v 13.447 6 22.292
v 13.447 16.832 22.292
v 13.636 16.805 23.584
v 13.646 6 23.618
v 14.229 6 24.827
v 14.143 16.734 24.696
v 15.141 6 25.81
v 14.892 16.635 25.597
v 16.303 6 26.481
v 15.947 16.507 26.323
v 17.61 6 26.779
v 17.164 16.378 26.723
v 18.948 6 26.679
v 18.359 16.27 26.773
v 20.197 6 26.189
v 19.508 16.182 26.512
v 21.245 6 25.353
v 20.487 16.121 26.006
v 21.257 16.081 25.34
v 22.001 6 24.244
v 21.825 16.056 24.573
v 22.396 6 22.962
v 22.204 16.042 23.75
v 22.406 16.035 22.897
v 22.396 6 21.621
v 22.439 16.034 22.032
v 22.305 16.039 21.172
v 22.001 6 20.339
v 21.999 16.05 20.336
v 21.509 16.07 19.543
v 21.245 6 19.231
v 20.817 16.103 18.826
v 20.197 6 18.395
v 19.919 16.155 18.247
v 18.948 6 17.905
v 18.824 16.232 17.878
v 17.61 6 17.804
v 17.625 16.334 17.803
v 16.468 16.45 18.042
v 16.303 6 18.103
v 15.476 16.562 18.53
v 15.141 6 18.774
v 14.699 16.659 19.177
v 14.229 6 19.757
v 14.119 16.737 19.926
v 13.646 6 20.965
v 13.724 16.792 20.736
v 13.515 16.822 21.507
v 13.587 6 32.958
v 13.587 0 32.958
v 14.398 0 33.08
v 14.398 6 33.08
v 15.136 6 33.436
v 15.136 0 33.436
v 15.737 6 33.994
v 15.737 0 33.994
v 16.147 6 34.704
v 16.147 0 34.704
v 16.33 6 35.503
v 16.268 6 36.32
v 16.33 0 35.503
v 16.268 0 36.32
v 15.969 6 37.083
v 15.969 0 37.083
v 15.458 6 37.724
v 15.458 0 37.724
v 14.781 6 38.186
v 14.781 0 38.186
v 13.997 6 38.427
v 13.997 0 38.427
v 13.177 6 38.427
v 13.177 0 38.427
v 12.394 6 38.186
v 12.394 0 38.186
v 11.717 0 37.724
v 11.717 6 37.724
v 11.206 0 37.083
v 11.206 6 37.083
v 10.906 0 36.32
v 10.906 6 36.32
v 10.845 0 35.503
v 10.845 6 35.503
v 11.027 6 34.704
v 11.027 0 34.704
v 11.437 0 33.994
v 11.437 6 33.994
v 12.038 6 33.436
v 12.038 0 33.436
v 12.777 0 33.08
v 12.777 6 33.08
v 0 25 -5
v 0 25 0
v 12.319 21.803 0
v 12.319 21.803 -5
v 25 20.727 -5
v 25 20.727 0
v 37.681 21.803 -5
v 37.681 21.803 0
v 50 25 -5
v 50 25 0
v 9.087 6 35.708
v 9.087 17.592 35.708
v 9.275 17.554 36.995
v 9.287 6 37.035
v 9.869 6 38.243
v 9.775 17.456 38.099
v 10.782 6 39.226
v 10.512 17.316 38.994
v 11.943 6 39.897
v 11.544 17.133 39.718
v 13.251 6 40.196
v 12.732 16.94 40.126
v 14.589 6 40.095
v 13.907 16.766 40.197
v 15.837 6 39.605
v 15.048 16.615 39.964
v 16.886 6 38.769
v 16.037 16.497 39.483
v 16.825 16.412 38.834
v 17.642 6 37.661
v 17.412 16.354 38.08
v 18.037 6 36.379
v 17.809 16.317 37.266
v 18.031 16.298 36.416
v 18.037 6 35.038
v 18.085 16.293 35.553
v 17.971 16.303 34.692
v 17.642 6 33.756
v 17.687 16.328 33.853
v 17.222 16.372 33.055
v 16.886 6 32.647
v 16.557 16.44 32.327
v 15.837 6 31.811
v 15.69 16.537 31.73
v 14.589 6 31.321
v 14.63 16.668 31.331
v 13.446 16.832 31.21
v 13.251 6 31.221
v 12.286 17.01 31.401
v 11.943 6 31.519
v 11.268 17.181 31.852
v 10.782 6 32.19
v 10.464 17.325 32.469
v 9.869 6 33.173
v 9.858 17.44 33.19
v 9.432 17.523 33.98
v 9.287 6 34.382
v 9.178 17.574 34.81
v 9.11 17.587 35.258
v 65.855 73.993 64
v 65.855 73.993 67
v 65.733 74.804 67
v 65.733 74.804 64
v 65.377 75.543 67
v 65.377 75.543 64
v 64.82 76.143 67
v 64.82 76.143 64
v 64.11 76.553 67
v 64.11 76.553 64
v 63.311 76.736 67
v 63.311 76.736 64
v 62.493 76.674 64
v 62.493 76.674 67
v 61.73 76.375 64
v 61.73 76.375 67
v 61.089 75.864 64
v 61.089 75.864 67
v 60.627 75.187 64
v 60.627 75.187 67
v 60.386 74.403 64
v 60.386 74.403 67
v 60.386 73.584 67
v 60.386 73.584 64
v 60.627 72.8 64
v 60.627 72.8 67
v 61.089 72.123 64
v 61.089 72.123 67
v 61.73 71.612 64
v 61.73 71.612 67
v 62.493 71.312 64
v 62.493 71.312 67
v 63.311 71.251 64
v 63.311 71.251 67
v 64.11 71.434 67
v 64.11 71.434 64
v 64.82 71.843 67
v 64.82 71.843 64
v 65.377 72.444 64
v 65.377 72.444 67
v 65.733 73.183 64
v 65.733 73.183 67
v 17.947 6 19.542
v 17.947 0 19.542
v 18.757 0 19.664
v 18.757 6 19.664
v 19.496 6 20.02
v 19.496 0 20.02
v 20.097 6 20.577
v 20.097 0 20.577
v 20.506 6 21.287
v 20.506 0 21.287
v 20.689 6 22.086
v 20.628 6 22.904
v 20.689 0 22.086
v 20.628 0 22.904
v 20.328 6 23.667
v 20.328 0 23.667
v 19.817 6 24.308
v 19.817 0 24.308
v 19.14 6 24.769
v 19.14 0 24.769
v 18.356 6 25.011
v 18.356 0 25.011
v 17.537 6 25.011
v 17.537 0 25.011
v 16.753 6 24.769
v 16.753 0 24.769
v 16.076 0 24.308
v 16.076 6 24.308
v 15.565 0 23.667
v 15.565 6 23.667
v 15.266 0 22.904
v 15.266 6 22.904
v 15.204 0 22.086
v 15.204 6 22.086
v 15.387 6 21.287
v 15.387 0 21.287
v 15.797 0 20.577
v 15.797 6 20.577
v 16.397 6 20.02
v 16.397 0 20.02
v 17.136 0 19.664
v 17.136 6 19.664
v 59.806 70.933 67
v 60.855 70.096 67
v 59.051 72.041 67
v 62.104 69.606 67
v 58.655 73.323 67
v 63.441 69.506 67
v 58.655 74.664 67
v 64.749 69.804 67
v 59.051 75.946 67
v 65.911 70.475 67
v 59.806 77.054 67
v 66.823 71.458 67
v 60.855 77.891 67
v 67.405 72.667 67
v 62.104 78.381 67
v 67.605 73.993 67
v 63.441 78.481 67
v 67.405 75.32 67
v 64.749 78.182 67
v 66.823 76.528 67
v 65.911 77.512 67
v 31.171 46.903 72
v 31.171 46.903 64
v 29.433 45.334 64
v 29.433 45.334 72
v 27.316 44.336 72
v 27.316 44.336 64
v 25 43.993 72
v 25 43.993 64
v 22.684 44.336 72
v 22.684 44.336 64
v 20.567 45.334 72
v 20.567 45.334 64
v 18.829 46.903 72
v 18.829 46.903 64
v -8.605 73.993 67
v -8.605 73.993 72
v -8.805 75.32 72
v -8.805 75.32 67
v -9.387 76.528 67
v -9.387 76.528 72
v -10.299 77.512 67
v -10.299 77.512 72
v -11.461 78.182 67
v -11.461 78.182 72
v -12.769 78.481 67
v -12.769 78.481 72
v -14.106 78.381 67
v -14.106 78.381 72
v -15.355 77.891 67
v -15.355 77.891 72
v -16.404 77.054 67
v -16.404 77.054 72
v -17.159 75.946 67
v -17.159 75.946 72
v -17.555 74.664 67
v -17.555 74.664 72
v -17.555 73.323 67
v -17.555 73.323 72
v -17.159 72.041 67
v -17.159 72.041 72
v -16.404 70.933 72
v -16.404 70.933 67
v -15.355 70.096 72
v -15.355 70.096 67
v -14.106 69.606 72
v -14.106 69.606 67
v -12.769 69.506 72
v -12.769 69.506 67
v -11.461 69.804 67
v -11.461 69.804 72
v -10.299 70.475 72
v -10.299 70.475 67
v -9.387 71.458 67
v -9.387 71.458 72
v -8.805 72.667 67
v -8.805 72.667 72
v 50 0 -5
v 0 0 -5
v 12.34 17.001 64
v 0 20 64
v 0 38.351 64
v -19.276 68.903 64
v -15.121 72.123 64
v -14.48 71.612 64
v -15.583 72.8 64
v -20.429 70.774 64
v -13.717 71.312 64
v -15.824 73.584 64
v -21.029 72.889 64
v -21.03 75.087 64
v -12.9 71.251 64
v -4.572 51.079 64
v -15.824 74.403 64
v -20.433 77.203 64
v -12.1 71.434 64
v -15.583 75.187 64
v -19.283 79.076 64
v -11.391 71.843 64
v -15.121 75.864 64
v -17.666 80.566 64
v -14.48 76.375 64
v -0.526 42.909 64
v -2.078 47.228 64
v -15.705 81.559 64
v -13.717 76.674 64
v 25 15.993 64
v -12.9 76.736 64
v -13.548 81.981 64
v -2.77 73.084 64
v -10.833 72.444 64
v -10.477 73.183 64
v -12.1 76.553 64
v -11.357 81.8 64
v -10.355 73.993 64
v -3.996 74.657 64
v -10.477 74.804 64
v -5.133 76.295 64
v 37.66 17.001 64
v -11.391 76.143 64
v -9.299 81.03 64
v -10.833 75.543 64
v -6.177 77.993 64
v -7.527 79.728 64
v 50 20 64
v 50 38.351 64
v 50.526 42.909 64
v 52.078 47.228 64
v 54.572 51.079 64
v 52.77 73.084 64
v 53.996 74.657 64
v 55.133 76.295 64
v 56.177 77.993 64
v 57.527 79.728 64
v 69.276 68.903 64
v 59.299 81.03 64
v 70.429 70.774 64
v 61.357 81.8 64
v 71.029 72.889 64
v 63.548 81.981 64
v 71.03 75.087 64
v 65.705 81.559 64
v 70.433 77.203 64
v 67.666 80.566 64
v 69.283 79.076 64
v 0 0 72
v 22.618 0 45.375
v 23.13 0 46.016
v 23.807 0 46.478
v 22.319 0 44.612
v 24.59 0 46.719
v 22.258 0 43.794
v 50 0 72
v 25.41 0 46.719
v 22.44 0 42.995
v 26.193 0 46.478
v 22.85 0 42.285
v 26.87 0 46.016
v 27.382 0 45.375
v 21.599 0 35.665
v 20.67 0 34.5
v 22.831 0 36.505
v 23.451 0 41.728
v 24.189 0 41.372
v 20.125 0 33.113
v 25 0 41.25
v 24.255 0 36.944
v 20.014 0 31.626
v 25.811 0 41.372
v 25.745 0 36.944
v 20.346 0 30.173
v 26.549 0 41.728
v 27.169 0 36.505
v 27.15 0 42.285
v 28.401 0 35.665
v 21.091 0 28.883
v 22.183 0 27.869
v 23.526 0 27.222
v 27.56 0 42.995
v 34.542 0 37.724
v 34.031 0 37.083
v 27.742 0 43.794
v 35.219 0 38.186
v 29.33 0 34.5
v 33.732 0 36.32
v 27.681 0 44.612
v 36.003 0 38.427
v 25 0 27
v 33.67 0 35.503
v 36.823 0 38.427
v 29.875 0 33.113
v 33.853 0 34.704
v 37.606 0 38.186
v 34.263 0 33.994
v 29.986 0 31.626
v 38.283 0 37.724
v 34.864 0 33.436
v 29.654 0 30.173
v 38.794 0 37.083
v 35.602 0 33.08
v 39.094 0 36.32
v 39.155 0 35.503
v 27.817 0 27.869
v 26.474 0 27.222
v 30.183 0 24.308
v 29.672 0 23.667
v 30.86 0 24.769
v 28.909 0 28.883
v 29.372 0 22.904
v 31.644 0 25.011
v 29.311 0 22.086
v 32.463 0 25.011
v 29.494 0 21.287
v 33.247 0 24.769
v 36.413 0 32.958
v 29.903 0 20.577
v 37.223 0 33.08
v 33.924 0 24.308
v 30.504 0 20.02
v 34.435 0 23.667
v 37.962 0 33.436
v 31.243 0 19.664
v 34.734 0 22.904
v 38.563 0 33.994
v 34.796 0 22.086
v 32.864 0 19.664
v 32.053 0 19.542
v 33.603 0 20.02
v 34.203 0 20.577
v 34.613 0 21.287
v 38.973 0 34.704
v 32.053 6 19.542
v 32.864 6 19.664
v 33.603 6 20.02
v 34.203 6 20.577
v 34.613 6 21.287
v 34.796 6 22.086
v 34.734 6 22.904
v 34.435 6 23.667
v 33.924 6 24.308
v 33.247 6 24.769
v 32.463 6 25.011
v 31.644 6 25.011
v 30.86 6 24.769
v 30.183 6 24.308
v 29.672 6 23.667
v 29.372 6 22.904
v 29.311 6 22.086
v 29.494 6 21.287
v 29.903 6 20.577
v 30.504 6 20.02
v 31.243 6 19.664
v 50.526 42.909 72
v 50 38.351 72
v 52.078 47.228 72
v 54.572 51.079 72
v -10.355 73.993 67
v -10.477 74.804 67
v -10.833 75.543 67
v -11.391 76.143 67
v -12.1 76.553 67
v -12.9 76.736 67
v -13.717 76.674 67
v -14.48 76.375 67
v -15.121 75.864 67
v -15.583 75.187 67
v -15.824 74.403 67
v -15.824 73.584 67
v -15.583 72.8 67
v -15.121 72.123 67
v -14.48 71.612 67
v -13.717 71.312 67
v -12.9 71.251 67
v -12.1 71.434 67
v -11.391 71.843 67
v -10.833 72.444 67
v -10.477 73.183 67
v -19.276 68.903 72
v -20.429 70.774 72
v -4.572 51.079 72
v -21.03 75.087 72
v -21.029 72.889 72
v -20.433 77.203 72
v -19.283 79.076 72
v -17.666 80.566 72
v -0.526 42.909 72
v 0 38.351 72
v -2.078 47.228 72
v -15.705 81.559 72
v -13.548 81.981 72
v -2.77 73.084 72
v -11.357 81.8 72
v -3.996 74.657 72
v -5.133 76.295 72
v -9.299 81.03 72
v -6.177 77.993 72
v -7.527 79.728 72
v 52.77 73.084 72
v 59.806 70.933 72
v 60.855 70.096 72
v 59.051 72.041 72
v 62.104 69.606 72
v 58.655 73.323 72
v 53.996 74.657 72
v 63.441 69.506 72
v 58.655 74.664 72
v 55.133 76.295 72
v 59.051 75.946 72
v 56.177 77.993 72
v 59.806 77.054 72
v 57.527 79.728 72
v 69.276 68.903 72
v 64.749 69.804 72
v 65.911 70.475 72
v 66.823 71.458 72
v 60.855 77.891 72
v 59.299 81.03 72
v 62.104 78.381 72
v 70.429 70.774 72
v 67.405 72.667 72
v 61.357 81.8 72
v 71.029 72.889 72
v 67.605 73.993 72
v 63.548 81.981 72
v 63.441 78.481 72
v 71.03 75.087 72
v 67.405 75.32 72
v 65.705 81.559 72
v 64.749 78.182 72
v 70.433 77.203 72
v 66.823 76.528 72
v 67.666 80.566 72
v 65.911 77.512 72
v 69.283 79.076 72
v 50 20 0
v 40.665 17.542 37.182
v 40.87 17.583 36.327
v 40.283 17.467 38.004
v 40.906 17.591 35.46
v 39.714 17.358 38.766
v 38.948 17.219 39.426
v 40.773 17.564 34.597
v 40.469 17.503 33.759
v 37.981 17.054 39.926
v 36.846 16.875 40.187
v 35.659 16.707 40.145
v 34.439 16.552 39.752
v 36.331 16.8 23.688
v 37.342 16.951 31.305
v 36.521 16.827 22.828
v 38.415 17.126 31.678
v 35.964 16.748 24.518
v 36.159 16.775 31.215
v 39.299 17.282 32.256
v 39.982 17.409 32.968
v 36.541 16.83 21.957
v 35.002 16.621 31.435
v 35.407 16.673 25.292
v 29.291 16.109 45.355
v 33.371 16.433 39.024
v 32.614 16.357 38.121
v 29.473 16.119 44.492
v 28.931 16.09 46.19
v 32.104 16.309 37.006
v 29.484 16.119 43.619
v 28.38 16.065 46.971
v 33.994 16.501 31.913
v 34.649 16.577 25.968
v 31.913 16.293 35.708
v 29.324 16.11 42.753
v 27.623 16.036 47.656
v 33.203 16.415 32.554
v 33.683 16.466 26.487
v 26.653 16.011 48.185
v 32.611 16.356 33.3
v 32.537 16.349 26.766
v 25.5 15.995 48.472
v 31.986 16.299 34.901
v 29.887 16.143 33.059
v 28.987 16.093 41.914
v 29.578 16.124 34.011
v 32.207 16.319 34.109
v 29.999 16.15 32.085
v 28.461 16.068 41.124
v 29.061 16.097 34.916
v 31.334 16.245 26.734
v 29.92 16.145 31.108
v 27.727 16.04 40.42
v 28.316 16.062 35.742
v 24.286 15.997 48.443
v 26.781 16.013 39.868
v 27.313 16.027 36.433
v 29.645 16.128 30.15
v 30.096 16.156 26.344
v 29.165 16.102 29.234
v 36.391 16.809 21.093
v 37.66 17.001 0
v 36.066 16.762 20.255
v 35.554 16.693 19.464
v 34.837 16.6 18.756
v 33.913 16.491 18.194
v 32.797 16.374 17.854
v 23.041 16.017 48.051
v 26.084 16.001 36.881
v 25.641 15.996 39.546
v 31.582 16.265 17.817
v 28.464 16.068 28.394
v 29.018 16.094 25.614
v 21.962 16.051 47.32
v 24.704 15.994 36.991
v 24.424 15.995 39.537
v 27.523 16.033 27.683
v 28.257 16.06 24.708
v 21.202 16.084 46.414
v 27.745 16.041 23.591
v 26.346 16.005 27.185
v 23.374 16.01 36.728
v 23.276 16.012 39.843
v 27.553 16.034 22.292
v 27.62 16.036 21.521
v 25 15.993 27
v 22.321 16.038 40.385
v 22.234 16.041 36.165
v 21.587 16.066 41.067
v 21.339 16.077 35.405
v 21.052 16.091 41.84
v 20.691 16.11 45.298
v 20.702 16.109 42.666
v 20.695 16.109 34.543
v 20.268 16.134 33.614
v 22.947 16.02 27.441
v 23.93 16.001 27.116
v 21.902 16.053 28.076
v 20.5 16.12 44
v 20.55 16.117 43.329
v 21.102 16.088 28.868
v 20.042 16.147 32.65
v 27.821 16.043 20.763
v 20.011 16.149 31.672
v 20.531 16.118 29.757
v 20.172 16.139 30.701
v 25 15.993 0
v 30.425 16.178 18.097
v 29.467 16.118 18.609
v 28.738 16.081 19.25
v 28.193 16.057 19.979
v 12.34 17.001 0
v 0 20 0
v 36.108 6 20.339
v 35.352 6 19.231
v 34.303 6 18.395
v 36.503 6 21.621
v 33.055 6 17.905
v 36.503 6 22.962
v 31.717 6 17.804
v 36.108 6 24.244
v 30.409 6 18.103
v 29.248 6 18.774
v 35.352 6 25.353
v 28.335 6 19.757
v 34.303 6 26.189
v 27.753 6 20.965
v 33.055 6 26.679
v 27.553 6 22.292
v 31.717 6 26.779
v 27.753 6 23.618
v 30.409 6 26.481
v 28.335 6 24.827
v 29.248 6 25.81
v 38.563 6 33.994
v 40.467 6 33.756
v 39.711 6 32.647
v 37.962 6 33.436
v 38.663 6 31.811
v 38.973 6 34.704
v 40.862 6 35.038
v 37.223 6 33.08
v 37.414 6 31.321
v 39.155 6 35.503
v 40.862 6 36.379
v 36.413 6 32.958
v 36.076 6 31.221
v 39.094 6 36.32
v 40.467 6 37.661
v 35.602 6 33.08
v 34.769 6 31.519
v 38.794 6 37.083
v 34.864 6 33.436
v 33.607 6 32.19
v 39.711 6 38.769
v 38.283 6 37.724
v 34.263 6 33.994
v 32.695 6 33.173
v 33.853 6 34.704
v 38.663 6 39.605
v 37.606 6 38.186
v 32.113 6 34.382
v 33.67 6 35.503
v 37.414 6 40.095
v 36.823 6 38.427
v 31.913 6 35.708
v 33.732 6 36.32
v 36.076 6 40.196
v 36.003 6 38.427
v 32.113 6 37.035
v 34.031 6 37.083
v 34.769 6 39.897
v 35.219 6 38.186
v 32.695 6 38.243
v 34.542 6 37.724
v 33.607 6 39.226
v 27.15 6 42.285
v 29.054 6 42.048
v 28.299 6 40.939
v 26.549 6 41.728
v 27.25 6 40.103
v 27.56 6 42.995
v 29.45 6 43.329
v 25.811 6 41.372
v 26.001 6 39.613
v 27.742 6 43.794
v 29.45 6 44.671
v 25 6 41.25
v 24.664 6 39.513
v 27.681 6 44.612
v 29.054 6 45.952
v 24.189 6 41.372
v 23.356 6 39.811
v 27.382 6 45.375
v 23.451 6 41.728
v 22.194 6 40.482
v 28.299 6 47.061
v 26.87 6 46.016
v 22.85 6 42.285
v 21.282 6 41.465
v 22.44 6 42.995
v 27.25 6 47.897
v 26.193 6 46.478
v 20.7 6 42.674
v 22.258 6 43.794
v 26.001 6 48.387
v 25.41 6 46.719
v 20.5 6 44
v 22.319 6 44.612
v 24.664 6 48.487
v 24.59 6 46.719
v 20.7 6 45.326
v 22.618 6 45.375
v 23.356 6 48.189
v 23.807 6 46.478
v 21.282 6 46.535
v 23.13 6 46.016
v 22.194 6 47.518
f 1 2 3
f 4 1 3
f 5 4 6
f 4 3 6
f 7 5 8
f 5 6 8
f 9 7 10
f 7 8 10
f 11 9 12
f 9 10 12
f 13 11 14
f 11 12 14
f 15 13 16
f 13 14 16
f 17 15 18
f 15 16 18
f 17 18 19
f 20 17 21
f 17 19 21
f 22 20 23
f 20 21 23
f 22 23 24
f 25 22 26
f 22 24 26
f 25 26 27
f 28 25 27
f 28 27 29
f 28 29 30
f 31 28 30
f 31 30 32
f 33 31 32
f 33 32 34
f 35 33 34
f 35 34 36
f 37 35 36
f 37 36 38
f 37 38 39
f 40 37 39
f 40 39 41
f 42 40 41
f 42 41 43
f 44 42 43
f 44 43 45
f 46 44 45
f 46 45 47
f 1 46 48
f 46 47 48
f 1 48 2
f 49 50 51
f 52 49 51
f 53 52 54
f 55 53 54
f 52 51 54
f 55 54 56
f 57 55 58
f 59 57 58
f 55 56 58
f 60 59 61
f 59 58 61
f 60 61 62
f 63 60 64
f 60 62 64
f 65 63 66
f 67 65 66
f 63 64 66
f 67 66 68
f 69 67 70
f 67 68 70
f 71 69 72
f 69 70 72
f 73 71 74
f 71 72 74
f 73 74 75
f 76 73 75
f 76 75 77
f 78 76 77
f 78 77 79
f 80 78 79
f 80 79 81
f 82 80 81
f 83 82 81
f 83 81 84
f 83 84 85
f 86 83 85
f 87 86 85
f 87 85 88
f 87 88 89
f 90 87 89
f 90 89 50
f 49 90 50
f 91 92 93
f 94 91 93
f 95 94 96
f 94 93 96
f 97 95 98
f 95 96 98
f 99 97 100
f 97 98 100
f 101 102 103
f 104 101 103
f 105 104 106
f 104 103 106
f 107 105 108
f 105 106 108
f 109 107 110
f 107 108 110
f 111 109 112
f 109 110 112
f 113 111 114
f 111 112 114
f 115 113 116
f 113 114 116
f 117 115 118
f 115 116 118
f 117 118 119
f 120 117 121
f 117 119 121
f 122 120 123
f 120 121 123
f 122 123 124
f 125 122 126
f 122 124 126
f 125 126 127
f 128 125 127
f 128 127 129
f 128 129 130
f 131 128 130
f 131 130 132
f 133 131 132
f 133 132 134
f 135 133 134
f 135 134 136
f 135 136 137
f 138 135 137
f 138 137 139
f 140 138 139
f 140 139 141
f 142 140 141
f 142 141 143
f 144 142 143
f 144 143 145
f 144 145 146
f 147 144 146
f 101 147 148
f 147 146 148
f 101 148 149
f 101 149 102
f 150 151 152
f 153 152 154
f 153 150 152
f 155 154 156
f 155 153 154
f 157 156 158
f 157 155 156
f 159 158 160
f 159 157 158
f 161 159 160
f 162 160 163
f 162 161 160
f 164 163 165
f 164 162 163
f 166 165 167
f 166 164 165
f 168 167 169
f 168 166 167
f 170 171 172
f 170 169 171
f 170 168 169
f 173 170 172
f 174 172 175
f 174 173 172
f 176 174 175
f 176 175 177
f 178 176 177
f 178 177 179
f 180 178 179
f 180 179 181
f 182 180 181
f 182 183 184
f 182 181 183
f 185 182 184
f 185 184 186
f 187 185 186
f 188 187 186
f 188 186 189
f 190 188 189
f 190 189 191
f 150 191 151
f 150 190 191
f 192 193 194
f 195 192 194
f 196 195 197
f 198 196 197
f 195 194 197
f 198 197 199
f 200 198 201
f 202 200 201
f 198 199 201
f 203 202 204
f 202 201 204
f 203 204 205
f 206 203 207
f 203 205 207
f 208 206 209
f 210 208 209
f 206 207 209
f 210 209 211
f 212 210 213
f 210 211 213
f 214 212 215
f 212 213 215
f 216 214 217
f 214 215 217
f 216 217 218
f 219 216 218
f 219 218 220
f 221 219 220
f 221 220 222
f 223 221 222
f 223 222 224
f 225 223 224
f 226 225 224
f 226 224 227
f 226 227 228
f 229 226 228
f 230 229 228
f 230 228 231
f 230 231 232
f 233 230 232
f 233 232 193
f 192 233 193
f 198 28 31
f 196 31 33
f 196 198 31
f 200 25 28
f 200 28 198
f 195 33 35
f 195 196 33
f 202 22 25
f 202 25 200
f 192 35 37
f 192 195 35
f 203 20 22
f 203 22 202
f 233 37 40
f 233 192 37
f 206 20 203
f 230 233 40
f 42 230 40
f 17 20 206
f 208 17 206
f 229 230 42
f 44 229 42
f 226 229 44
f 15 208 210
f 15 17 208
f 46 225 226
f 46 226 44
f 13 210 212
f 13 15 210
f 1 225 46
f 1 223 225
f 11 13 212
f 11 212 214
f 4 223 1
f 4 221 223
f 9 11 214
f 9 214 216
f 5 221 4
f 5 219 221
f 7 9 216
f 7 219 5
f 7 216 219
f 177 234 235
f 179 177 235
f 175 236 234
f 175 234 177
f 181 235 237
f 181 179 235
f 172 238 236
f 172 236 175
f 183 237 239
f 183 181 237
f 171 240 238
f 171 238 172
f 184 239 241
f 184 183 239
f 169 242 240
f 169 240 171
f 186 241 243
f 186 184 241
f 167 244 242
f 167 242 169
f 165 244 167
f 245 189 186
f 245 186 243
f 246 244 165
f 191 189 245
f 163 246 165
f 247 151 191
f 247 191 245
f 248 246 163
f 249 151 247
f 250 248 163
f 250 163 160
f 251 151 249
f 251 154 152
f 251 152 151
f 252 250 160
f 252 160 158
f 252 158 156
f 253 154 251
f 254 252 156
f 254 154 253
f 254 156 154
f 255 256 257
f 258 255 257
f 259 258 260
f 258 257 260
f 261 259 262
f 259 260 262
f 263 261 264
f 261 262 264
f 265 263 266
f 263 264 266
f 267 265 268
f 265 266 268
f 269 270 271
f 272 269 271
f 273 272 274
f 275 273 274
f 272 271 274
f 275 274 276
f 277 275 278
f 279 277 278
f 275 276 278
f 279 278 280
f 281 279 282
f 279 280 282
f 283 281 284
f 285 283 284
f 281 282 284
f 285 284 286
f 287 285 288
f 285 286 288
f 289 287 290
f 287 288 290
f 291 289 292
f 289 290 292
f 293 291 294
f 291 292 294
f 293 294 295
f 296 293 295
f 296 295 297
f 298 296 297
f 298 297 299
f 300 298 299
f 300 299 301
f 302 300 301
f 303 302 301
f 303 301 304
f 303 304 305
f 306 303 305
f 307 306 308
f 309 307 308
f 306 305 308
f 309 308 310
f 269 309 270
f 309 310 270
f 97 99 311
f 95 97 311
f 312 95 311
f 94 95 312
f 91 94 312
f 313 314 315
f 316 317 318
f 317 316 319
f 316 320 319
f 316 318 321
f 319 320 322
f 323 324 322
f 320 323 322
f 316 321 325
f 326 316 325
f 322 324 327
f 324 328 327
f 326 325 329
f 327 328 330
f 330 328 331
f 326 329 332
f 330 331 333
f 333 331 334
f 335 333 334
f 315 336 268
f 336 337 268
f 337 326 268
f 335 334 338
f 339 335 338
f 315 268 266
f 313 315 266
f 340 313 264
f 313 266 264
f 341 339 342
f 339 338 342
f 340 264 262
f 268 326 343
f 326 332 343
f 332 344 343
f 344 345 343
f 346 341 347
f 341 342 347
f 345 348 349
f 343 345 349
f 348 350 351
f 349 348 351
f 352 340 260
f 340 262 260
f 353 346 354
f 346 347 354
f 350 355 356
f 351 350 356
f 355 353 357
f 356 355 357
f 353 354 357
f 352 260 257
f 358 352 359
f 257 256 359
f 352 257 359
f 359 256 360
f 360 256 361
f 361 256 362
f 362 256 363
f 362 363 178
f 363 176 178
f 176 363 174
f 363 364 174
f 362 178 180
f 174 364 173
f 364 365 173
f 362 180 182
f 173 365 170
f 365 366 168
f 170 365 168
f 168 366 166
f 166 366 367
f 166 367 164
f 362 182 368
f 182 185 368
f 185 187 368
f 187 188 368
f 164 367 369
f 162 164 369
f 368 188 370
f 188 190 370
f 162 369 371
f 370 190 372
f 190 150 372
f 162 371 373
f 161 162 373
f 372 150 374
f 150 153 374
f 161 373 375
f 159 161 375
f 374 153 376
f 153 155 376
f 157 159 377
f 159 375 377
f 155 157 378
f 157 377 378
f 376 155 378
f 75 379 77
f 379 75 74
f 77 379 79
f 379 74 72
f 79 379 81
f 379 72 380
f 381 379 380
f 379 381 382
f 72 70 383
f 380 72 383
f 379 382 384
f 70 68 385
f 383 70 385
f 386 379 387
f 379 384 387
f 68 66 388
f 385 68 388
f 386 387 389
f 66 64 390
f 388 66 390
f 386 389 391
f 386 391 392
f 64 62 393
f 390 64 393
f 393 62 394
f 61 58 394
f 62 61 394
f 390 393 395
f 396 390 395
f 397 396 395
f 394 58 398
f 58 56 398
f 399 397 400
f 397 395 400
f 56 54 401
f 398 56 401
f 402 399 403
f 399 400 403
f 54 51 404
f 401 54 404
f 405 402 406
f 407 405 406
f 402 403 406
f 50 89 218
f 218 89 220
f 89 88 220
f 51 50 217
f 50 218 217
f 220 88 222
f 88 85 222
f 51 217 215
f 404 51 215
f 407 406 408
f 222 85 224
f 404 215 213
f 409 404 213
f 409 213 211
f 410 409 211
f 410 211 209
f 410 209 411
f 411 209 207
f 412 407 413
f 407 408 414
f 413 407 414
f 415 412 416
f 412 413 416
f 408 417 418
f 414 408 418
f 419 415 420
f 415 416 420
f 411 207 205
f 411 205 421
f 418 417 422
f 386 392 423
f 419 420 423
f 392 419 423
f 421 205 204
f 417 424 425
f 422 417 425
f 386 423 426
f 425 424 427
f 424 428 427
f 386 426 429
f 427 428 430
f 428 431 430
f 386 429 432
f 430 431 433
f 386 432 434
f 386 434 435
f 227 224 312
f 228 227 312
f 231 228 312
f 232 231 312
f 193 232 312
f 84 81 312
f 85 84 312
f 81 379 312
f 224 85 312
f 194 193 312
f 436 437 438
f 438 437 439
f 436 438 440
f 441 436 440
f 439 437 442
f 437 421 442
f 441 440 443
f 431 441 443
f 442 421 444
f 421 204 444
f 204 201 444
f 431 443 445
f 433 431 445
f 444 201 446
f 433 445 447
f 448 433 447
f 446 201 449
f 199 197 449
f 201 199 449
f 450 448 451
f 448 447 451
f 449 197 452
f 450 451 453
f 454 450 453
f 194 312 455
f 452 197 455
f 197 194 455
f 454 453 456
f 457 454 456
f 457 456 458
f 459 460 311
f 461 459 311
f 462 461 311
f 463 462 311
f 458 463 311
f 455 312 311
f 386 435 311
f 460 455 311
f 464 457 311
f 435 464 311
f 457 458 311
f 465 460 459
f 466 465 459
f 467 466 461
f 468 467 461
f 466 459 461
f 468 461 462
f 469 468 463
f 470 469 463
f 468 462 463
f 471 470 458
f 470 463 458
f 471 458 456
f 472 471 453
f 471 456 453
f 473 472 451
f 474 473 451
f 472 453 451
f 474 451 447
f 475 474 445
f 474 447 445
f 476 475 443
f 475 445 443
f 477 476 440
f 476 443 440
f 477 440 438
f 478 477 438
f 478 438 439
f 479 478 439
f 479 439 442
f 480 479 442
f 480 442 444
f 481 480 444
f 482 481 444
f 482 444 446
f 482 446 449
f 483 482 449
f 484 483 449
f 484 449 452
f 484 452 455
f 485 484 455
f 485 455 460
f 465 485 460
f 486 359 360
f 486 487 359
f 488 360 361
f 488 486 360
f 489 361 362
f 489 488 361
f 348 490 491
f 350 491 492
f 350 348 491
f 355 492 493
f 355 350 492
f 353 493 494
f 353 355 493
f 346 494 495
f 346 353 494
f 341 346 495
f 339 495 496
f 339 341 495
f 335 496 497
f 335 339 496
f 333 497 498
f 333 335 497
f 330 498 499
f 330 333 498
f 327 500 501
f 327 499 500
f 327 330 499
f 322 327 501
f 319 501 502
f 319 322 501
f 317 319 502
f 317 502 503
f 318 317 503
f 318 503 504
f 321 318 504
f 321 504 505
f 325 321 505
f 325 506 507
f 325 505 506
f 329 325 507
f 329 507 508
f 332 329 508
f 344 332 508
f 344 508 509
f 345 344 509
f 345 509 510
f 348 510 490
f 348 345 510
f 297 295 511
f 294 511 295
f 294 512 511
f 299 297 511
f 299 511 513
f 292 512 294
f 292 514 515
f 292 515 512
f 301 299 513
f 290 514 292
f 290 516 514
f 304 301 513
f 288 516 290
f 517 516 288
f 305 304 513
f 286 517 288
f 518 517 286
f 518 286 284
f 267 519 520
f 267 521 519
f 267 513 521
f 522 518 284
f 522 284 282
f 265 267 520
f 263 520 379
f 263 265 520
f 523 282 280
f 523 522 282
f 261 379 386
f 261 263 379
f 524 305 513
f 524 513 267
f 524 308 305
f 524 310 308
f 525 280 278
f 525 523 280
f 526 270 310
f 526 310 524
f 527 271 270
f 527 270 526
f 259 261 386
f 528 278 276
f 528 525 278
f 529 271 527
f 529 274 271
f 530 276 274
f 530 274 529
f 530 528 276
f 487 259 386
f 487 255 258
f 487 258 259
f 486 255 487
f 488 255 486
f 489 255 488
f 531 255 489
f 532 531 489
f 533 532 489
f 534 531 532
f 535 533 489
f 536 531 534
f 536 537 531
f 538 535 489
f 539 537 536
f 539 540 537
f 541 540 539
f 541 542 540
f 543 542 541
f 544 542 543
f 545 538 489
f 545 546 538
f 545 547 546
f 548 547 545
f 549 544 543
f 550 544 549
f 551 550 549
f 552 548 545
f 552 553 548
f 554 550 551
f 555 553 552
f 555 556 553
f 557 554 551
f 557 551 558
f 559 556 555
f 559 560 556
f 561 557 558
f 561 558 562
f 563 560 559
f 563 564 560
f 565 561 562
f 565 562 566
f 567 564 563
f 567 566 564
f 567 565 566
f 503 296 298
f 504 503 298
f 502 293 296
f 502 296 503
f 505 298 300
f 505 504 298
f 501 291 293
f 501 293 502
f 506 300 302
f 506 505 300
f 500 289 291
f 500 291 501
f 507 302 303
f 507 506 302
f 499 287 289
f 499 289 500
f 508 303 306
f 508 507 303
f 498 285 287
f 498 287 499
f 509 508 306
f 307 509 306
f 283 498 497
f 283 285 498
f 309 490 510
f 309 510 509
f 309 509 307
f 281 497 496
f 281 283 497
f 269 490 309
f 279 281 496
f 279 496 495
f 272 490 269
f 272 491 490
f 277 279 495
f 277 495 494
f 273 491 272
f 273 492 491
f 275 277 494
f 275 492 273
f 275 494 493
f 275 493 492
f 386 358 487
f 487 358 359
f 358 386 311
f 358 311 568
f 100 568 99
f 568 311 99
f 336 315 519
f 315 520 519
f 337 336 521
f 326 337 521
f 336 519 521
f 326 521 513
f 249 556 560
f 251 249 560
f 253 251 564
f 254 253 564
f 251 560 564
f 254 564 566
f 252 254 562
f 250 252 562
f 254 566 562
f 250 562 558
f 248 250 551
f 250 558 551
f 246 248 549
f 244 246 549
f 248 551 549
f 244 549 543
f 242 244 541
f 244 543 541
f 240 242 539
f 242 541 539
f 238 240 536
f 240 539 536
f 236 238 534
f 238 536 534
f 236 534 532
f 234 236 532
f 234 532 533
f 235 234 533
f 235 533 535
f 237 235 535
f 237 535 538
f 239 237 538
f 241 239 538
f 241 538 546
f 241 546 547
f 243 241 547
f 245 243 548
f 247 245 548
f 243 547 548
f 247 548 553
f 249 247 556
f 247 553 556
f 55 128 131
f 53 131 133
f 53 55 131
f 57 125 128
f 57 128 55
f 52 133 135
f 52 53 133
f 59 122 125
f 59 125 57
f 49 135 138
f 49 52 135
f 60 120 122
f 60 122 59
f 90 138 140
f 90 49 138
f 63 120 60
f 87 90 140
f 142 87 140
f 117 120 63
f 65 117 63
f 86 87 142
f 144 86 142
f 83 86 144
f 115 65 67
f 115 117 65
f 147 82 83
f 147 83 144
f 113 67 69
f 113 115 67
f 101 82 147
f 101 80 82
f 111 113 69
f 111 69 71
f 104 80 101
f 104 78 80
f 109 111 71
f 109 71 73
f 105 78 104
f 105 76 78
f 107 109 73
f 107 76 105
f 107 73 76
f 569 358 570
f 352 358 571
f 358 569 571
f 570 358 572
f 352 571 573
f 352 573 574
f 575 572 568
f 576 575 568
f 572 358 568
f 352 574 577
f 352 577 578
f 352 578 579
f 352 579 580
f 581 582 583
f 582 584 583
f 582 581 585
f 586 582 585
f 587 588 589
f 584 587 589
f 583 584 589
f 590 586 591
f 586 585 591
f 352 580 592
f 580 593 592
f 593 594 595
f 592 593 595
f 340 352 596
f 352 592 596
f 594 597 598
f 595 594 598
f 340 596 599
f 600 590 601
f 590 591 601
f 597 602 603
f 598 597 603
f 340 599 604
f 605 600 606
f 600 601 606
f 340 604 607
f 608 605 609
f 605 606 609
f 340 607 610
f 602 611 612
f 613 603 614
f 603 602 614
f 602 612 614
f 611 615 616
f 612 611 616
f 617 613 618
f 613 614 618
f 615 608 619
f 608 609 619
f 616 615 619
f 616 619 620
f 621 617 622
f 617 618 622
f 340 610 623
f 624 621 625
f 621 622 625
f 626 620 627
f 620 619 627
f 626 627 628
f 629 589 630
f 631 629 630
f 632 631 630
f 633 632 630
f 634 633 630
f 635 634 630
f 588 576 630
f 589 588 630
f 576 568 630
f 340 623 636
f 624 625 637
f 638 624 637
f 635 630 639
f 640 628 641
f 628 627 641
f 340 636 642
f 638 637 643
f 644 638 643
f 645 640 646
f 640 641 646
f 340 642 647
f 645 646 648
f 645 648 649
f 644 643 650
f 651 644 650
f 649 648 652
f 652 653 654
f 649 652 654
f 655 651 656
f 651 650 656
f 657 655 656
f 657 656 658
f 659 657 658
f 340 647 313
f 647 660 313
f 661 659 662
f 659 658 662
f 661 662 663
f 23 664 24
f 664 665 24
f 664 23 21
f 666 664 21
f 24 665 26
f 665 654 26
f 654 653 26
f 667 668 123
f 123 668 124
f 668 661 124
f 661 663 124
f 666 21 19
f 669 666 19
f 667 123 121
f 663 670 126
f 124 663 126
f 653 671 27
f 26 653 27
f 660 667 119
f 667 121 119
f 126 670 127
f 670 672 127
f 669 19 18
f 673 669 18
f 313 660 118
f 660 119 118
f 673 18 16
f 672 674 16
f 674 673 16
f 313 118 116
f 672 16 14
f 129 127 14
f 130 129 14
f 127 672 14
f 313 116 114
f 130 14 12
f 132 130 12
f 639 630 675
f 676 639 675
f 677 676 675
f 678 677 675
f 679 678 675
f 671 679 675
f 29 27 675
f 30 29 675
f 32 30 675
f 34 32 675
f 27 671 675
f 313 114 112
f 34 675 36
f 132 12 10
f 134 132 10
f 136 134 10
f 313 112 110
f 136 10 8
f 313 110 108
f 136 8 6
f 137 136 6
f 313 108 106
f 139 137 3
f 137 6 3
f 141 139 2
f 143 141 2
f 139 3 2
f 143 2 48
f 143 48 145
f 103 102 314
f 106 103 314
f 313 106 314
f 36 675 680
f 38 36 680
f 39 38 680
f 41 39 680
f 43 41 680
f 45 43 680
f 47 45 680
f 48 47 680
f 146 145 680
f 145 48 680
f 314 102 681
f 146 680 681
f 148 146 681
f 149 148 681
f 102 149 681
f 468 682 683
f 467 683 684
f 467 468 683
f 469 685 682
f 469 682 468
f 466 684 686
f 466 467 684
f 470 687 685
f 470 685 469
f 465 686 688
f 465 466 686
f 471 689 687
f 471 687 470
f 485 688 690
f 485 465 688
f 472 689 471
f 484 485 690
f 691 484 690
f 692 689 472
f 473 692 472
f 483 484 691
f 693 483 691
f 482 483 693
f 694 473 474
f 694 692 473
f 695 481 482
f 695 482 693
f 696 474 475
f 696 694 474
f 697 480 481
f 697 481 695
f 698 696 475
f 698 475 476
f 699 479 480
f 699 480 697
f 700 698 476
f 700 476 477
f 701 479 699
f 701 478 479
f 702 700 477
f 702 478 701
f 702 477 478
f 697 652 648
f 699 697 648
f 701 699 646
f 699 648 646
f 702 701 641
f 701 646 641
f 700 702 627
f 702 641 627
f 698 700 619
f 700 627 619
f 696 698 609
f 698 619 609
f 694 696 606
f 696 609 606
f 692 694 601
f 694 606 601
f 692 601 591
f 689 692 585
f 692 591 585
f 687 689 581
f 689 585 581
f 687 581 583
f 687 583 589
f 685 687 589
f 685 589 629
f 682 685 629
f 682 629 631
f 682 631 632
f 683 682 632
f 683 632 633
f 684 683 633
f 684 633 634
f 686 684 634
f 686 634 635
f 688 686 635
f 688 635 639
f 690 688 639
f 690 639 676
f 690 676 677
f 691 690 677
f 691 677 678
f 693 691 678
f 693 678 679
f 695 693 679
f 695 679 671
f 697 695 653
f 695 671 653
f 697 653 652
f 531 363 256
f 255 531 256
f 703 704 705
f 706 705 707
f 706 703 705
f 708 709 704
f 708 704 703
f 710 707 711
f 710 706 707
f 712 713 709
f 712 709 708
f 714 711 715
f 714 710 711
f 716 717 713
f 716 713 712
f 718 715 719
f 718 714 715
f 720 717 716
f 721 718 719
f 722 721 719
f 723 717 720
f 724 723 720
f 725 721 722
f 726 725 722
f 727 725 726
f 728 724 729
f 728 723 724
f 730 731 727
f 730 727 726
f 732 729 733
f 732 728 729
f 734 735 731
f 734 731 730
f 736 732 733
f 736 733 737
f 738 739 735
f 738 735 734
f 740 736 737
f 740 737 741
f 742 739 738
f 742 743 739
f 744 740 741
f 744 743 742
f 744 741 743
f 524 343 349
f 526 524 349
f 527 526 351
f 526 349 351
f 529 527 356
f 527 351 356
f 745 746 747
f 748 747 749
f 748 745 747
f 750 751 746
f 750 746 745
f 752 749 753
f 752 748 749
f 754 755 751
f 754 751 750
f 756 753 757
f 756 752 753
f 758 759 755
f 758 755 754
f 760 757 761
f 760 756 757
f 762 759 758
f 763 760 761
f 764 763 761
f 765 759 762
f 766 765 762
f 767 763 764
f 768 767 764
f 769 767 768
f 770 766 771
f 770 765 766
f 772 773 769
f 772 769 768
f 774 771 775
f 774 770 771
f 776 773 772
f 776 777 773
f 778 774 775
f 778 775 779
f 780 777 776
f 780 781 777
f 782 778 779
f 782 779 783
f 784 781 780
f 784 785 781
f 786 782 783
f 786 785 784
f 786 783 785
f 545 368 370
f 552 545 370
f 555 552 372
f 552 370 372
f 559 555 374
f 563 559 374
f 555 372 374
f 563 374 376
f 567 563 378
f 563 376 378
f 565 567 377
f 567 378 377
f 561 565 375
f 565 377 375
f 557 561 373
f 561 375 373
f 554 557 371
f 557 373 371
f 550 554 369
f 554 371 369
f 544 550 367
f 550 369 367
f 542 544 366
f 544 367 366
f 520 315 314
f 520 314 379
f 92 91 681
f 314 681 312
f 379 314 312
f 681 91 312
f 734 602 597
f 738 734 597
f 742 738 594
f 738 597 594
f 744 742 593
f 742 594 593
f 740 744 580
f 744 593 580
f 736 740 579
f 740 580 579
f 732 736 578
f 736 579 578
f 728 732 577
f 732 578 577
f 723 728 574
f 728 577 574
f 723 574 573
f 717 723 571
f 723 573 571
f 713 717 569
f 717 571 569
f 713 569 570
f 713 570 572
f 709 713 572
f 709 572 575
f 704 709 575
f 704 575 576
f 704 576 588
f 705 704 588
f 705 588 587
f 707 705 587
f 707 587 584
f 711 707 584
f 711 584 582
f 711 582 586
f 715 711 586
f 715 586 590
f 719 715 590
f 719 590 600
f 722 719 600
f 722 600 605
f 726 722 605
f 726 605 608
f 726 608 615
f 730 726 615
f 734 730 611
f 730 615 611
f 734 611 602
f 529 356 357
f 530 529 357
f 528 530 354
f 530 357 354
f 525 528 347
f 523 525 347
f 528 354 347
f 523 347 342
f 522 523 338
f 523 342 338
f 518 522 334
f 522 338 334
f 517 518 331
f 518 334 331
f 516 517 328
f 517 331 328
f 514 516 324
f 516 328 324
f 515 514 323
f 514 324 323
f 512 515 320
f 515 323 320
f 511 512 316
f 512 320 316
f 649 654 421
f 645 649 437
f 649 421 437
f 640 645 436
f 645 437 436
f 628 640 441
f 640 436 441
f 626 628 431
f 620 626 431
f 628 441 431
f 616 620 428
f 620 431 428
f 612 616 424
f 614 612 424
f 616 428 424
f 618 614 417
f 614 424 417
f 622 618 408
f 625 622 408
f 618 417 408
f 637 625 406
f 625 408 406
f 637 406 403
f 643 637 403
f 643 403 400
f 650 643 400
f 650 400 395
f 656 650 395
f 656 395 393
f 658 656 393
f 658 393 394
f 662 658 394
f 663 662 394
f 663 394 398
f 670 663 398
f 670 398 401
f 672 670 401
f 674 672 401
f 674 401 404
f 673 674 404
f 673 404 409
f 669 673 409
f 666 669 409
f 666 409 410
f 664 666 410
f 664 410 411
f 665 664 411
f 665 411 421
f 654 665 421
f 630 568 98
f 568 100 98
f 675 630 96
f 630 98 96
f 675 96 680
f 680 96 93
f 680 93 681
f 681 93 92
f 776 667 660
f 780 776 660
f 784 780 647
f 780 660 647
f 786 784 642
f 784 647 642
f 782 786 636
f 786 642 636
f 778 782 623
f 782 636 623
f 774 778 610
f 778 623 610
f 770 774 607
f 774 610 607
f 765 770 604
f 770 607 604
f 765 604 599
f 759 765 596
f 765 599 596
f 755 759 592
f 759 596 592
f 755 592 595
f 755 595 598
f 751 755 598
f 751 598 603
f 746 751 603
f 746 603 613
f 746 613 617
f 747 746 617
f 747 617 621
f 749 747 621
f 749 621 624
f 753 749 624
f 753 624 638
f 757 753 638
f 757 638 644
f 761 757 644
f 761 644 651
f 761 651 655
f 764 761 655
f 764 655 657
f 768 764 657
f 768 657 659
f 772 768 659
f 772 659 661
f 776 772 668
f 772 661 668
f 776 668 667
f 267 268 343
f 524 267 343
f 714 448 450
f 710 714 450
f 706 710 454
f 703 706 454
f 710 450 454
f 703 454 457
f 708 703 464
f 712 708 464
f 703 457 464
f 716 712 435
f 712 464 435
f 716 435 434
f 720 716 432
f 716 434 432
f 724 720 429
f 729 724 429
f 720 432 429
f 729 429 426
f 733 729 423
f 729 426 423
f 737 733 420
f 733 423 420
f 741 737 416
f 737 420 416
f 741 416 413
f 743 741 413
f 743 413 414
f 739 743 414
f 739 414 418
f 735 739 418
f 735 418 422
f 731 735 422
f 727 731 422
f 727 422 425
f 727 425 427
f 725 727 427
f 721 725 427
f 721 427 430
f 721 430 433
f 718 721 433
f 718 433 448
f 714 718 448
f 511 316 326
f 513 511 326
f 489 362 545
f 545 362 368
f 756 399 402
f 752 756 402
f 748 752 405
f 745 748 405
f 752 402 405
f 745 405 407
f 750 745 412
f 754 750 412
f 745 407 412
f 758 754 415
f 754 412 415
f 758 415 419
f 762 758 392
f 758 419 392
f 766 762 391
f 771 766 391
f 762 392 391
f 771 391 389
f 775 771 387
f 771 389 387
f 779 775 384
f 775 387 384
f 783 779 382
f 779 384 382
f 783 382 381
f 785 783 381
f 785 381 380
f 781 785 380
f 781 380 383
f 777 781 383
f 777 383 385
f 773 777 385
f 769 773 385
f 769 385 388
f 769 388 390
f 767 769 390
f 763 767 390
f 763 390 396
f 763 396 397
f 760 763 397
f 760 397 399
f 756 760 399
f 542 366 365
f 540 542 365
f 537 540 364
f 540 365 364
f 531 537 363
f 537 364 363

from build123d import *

# Parameters (mm, degrees)
BOSS_EXTRUDE1_DEPTH = 64
BOSS_EXTRUDE2_DEPTH = 5
SKETCH5_R           = 2.75
BOSS_EXTRUDE3_DEPTH = 8
SKETCH6_R           = 4.5
CUT_EXTRUDE1_DEPTH  = 5
SKETCH7_R           = 2.75
SKETCH7_R_2         = 5
CUT_EXTRUDE2_DEPTH  = 131.241540308
SKETCH8_R           = 4.5
CUT_EXTRUDE3_DEPTH  = 14
FILLET2_R           = 20


with BuildPart() as part:
    # Sketch3 → Boss-Extrude1 (new body)
    with BuildSketch(Plane.XY):
        with BuildLine():
            Line((0, 0), (50, 0))
            Line((50, 0), (50, 20))
            ThreePointArc((50, 20), (25, 15.993420768), (0, 20))
            Line((0, 20), (0, 0))
        make_face()
    extrude(amount=BOSS_EXTRUDE1_DEPTH)

    # Sketch4 → Boss-Extrude2 (add)
    with BuildSketch(Plane(origin=(0, 0, 0), x_dir=(-1, 0, 0), z_dir=(0, 0, -1))):
        with BuildLine():
            Line((-50, 0), (0, 0))
            Line((0, 0), (0, 25))
            ThreePointArc((0, 25), (-25, 20.726789434), (-50, 25))
            Line((-50, 25), (-50, 0))
        make_face()
    extrude(amount=BOSS_EXTRUDE2_DEPTH)

    # Sketch5 → Boss-Extrude3 (add)
    with BuildSketch(Plane.XY.offset(64)):
        with BuildLine():
            Line((0, 0), (50, 0))
            Line((50, 0), (50, 45.536190526))
            Line((50, 45.536190526), (69.276231493, 68.902511677))
            ThreePointArc((69.276231493, 68.902511677), (67.66630765, 80.565752686), (56.176914536, 77.993420768))
            ThreePointArc((56.176914536, 77.993420768), (54.575493633, 75.468066292), (52.77001177, 73.084329859))
            Line((52.77001177, 73.084329859), (31.171113727, 46.902511677))
            ThreePointArc((31.171113727, 46.902511677), (25, 43.993420768), (18.828886273, 46.902511677))
            Line((18.828886273, 46.902511677), (-2.77001177, 73.084329859))
            ThreePointArc((-2.77001177, 73.084329859), (-4.575493633, 75.468066292), (-6.176914536, 77.993420768))
            ThreePointArc((-6.176914536, 77.993420768), (-17.66630765, 80.565752686), (-19.276231493, 68.902511677))
            Line((-19.276231493, 68.902511677), (0, 45.536190526))
            Line((0, 45.536190526), (0, 0))
        make_face()
        with Locations((63.105117767, 73.993420768)):
            Circle(SKETCH5_R, mode=Mode.SUBTRACT)
        with Locations((-13.105117767, 73.993420768)):
            Circle(SKETCH5_R, mode=Mode.SUBTRACT)
    extrude(amount=BOSS_EXTRUDE3_DEPTH)

    # Sketch6 → Cut-Extrude1 (cut)
    with BuildSketch(Plane.XY.offset(72)):
        with Locations((-13.105117767, 73.993420768)):
            Circle(SKETCH6_R)
        with Locations((63.105117767, 73.993420768)):
            Circle(SKETCH6_R)
    extrude(amount=-CUT_EXTRUDE1_DEPTH, mode=Mode.SUBTRACT)

    # Sketch7 → Cut-Extrude2 (cut, through all)
    with BuildSketch(Plane.XZ):
        with Locations(Location((25, 44, 0), (0, 0, 270))):
            Circle(SKETCH7_R)
        with Locations(Location((36.412678196, 35.708203932, 0), (0, 0, 270))):
            Circle(SKETCH7_R)
        with Locations(Location((32.053423028, 22.291796068, 0), (0, 0, 270))):
            Circle(SKETCH7_R)
        with Locations(Location((17.946576972, 22.291796068, 0), (0, 0, 270))):
            Circle(SKETCH7_R)
        with Locations(Location((13.587321804, 35.708203932, 0), (0, 0, 270))):
            Circle(SKETCH7_R)
        with Locations(Location((25, 32, 0), (0, 0, 270))):
            Circle(SKETCH7_R_2)
    extrude(amount=-CUT_EXTRUDE2_DEPTH, mode=Mode.SUBTRACT)

    # Sketch8 → Cut-Extrude3 (cut)
    with BuildSketch(Plane(origin=(0, 20, 0), x_dir=(1, 0, 0), z_dir=(0, 1, 0))):
        with Locations(Location((25, -44, 0), (0, 0, 180))):
            Circle(SKETCH8_R)
        with Locations(Location((17.946576972, -22.291796068, 0), (0, 0, 180))):
            Circle(SKETCH8_R)
        with Locations(Location((32.053423028, -22.291796068, 0), (0, 0, 180))):
            Circle(SKETCH8_R)
        with Locations(Location((36.412678196, -35.708203932, 0), (0, 0, 180))):
            Circle(SKETCH8_R)
        with Locations(Location((13.587321804, -35.708203932, 0), (0, 0, 180))):
            Circle(SKETCH8_R)
    extrude(amount=-CUT_EXTRUDE3_DEPTH, mode=Mode.SUBTRACT)

    # Fillet2
    fillet2_edges = [part.edges().sort_by_distance(p)[0] for p in [
        (0, 45.536190526, 68),
        (50, 45.536190526, 68),
    ]]
    fillet(fillet2_edges, radius=FILLET2_R)


solid = part.part
